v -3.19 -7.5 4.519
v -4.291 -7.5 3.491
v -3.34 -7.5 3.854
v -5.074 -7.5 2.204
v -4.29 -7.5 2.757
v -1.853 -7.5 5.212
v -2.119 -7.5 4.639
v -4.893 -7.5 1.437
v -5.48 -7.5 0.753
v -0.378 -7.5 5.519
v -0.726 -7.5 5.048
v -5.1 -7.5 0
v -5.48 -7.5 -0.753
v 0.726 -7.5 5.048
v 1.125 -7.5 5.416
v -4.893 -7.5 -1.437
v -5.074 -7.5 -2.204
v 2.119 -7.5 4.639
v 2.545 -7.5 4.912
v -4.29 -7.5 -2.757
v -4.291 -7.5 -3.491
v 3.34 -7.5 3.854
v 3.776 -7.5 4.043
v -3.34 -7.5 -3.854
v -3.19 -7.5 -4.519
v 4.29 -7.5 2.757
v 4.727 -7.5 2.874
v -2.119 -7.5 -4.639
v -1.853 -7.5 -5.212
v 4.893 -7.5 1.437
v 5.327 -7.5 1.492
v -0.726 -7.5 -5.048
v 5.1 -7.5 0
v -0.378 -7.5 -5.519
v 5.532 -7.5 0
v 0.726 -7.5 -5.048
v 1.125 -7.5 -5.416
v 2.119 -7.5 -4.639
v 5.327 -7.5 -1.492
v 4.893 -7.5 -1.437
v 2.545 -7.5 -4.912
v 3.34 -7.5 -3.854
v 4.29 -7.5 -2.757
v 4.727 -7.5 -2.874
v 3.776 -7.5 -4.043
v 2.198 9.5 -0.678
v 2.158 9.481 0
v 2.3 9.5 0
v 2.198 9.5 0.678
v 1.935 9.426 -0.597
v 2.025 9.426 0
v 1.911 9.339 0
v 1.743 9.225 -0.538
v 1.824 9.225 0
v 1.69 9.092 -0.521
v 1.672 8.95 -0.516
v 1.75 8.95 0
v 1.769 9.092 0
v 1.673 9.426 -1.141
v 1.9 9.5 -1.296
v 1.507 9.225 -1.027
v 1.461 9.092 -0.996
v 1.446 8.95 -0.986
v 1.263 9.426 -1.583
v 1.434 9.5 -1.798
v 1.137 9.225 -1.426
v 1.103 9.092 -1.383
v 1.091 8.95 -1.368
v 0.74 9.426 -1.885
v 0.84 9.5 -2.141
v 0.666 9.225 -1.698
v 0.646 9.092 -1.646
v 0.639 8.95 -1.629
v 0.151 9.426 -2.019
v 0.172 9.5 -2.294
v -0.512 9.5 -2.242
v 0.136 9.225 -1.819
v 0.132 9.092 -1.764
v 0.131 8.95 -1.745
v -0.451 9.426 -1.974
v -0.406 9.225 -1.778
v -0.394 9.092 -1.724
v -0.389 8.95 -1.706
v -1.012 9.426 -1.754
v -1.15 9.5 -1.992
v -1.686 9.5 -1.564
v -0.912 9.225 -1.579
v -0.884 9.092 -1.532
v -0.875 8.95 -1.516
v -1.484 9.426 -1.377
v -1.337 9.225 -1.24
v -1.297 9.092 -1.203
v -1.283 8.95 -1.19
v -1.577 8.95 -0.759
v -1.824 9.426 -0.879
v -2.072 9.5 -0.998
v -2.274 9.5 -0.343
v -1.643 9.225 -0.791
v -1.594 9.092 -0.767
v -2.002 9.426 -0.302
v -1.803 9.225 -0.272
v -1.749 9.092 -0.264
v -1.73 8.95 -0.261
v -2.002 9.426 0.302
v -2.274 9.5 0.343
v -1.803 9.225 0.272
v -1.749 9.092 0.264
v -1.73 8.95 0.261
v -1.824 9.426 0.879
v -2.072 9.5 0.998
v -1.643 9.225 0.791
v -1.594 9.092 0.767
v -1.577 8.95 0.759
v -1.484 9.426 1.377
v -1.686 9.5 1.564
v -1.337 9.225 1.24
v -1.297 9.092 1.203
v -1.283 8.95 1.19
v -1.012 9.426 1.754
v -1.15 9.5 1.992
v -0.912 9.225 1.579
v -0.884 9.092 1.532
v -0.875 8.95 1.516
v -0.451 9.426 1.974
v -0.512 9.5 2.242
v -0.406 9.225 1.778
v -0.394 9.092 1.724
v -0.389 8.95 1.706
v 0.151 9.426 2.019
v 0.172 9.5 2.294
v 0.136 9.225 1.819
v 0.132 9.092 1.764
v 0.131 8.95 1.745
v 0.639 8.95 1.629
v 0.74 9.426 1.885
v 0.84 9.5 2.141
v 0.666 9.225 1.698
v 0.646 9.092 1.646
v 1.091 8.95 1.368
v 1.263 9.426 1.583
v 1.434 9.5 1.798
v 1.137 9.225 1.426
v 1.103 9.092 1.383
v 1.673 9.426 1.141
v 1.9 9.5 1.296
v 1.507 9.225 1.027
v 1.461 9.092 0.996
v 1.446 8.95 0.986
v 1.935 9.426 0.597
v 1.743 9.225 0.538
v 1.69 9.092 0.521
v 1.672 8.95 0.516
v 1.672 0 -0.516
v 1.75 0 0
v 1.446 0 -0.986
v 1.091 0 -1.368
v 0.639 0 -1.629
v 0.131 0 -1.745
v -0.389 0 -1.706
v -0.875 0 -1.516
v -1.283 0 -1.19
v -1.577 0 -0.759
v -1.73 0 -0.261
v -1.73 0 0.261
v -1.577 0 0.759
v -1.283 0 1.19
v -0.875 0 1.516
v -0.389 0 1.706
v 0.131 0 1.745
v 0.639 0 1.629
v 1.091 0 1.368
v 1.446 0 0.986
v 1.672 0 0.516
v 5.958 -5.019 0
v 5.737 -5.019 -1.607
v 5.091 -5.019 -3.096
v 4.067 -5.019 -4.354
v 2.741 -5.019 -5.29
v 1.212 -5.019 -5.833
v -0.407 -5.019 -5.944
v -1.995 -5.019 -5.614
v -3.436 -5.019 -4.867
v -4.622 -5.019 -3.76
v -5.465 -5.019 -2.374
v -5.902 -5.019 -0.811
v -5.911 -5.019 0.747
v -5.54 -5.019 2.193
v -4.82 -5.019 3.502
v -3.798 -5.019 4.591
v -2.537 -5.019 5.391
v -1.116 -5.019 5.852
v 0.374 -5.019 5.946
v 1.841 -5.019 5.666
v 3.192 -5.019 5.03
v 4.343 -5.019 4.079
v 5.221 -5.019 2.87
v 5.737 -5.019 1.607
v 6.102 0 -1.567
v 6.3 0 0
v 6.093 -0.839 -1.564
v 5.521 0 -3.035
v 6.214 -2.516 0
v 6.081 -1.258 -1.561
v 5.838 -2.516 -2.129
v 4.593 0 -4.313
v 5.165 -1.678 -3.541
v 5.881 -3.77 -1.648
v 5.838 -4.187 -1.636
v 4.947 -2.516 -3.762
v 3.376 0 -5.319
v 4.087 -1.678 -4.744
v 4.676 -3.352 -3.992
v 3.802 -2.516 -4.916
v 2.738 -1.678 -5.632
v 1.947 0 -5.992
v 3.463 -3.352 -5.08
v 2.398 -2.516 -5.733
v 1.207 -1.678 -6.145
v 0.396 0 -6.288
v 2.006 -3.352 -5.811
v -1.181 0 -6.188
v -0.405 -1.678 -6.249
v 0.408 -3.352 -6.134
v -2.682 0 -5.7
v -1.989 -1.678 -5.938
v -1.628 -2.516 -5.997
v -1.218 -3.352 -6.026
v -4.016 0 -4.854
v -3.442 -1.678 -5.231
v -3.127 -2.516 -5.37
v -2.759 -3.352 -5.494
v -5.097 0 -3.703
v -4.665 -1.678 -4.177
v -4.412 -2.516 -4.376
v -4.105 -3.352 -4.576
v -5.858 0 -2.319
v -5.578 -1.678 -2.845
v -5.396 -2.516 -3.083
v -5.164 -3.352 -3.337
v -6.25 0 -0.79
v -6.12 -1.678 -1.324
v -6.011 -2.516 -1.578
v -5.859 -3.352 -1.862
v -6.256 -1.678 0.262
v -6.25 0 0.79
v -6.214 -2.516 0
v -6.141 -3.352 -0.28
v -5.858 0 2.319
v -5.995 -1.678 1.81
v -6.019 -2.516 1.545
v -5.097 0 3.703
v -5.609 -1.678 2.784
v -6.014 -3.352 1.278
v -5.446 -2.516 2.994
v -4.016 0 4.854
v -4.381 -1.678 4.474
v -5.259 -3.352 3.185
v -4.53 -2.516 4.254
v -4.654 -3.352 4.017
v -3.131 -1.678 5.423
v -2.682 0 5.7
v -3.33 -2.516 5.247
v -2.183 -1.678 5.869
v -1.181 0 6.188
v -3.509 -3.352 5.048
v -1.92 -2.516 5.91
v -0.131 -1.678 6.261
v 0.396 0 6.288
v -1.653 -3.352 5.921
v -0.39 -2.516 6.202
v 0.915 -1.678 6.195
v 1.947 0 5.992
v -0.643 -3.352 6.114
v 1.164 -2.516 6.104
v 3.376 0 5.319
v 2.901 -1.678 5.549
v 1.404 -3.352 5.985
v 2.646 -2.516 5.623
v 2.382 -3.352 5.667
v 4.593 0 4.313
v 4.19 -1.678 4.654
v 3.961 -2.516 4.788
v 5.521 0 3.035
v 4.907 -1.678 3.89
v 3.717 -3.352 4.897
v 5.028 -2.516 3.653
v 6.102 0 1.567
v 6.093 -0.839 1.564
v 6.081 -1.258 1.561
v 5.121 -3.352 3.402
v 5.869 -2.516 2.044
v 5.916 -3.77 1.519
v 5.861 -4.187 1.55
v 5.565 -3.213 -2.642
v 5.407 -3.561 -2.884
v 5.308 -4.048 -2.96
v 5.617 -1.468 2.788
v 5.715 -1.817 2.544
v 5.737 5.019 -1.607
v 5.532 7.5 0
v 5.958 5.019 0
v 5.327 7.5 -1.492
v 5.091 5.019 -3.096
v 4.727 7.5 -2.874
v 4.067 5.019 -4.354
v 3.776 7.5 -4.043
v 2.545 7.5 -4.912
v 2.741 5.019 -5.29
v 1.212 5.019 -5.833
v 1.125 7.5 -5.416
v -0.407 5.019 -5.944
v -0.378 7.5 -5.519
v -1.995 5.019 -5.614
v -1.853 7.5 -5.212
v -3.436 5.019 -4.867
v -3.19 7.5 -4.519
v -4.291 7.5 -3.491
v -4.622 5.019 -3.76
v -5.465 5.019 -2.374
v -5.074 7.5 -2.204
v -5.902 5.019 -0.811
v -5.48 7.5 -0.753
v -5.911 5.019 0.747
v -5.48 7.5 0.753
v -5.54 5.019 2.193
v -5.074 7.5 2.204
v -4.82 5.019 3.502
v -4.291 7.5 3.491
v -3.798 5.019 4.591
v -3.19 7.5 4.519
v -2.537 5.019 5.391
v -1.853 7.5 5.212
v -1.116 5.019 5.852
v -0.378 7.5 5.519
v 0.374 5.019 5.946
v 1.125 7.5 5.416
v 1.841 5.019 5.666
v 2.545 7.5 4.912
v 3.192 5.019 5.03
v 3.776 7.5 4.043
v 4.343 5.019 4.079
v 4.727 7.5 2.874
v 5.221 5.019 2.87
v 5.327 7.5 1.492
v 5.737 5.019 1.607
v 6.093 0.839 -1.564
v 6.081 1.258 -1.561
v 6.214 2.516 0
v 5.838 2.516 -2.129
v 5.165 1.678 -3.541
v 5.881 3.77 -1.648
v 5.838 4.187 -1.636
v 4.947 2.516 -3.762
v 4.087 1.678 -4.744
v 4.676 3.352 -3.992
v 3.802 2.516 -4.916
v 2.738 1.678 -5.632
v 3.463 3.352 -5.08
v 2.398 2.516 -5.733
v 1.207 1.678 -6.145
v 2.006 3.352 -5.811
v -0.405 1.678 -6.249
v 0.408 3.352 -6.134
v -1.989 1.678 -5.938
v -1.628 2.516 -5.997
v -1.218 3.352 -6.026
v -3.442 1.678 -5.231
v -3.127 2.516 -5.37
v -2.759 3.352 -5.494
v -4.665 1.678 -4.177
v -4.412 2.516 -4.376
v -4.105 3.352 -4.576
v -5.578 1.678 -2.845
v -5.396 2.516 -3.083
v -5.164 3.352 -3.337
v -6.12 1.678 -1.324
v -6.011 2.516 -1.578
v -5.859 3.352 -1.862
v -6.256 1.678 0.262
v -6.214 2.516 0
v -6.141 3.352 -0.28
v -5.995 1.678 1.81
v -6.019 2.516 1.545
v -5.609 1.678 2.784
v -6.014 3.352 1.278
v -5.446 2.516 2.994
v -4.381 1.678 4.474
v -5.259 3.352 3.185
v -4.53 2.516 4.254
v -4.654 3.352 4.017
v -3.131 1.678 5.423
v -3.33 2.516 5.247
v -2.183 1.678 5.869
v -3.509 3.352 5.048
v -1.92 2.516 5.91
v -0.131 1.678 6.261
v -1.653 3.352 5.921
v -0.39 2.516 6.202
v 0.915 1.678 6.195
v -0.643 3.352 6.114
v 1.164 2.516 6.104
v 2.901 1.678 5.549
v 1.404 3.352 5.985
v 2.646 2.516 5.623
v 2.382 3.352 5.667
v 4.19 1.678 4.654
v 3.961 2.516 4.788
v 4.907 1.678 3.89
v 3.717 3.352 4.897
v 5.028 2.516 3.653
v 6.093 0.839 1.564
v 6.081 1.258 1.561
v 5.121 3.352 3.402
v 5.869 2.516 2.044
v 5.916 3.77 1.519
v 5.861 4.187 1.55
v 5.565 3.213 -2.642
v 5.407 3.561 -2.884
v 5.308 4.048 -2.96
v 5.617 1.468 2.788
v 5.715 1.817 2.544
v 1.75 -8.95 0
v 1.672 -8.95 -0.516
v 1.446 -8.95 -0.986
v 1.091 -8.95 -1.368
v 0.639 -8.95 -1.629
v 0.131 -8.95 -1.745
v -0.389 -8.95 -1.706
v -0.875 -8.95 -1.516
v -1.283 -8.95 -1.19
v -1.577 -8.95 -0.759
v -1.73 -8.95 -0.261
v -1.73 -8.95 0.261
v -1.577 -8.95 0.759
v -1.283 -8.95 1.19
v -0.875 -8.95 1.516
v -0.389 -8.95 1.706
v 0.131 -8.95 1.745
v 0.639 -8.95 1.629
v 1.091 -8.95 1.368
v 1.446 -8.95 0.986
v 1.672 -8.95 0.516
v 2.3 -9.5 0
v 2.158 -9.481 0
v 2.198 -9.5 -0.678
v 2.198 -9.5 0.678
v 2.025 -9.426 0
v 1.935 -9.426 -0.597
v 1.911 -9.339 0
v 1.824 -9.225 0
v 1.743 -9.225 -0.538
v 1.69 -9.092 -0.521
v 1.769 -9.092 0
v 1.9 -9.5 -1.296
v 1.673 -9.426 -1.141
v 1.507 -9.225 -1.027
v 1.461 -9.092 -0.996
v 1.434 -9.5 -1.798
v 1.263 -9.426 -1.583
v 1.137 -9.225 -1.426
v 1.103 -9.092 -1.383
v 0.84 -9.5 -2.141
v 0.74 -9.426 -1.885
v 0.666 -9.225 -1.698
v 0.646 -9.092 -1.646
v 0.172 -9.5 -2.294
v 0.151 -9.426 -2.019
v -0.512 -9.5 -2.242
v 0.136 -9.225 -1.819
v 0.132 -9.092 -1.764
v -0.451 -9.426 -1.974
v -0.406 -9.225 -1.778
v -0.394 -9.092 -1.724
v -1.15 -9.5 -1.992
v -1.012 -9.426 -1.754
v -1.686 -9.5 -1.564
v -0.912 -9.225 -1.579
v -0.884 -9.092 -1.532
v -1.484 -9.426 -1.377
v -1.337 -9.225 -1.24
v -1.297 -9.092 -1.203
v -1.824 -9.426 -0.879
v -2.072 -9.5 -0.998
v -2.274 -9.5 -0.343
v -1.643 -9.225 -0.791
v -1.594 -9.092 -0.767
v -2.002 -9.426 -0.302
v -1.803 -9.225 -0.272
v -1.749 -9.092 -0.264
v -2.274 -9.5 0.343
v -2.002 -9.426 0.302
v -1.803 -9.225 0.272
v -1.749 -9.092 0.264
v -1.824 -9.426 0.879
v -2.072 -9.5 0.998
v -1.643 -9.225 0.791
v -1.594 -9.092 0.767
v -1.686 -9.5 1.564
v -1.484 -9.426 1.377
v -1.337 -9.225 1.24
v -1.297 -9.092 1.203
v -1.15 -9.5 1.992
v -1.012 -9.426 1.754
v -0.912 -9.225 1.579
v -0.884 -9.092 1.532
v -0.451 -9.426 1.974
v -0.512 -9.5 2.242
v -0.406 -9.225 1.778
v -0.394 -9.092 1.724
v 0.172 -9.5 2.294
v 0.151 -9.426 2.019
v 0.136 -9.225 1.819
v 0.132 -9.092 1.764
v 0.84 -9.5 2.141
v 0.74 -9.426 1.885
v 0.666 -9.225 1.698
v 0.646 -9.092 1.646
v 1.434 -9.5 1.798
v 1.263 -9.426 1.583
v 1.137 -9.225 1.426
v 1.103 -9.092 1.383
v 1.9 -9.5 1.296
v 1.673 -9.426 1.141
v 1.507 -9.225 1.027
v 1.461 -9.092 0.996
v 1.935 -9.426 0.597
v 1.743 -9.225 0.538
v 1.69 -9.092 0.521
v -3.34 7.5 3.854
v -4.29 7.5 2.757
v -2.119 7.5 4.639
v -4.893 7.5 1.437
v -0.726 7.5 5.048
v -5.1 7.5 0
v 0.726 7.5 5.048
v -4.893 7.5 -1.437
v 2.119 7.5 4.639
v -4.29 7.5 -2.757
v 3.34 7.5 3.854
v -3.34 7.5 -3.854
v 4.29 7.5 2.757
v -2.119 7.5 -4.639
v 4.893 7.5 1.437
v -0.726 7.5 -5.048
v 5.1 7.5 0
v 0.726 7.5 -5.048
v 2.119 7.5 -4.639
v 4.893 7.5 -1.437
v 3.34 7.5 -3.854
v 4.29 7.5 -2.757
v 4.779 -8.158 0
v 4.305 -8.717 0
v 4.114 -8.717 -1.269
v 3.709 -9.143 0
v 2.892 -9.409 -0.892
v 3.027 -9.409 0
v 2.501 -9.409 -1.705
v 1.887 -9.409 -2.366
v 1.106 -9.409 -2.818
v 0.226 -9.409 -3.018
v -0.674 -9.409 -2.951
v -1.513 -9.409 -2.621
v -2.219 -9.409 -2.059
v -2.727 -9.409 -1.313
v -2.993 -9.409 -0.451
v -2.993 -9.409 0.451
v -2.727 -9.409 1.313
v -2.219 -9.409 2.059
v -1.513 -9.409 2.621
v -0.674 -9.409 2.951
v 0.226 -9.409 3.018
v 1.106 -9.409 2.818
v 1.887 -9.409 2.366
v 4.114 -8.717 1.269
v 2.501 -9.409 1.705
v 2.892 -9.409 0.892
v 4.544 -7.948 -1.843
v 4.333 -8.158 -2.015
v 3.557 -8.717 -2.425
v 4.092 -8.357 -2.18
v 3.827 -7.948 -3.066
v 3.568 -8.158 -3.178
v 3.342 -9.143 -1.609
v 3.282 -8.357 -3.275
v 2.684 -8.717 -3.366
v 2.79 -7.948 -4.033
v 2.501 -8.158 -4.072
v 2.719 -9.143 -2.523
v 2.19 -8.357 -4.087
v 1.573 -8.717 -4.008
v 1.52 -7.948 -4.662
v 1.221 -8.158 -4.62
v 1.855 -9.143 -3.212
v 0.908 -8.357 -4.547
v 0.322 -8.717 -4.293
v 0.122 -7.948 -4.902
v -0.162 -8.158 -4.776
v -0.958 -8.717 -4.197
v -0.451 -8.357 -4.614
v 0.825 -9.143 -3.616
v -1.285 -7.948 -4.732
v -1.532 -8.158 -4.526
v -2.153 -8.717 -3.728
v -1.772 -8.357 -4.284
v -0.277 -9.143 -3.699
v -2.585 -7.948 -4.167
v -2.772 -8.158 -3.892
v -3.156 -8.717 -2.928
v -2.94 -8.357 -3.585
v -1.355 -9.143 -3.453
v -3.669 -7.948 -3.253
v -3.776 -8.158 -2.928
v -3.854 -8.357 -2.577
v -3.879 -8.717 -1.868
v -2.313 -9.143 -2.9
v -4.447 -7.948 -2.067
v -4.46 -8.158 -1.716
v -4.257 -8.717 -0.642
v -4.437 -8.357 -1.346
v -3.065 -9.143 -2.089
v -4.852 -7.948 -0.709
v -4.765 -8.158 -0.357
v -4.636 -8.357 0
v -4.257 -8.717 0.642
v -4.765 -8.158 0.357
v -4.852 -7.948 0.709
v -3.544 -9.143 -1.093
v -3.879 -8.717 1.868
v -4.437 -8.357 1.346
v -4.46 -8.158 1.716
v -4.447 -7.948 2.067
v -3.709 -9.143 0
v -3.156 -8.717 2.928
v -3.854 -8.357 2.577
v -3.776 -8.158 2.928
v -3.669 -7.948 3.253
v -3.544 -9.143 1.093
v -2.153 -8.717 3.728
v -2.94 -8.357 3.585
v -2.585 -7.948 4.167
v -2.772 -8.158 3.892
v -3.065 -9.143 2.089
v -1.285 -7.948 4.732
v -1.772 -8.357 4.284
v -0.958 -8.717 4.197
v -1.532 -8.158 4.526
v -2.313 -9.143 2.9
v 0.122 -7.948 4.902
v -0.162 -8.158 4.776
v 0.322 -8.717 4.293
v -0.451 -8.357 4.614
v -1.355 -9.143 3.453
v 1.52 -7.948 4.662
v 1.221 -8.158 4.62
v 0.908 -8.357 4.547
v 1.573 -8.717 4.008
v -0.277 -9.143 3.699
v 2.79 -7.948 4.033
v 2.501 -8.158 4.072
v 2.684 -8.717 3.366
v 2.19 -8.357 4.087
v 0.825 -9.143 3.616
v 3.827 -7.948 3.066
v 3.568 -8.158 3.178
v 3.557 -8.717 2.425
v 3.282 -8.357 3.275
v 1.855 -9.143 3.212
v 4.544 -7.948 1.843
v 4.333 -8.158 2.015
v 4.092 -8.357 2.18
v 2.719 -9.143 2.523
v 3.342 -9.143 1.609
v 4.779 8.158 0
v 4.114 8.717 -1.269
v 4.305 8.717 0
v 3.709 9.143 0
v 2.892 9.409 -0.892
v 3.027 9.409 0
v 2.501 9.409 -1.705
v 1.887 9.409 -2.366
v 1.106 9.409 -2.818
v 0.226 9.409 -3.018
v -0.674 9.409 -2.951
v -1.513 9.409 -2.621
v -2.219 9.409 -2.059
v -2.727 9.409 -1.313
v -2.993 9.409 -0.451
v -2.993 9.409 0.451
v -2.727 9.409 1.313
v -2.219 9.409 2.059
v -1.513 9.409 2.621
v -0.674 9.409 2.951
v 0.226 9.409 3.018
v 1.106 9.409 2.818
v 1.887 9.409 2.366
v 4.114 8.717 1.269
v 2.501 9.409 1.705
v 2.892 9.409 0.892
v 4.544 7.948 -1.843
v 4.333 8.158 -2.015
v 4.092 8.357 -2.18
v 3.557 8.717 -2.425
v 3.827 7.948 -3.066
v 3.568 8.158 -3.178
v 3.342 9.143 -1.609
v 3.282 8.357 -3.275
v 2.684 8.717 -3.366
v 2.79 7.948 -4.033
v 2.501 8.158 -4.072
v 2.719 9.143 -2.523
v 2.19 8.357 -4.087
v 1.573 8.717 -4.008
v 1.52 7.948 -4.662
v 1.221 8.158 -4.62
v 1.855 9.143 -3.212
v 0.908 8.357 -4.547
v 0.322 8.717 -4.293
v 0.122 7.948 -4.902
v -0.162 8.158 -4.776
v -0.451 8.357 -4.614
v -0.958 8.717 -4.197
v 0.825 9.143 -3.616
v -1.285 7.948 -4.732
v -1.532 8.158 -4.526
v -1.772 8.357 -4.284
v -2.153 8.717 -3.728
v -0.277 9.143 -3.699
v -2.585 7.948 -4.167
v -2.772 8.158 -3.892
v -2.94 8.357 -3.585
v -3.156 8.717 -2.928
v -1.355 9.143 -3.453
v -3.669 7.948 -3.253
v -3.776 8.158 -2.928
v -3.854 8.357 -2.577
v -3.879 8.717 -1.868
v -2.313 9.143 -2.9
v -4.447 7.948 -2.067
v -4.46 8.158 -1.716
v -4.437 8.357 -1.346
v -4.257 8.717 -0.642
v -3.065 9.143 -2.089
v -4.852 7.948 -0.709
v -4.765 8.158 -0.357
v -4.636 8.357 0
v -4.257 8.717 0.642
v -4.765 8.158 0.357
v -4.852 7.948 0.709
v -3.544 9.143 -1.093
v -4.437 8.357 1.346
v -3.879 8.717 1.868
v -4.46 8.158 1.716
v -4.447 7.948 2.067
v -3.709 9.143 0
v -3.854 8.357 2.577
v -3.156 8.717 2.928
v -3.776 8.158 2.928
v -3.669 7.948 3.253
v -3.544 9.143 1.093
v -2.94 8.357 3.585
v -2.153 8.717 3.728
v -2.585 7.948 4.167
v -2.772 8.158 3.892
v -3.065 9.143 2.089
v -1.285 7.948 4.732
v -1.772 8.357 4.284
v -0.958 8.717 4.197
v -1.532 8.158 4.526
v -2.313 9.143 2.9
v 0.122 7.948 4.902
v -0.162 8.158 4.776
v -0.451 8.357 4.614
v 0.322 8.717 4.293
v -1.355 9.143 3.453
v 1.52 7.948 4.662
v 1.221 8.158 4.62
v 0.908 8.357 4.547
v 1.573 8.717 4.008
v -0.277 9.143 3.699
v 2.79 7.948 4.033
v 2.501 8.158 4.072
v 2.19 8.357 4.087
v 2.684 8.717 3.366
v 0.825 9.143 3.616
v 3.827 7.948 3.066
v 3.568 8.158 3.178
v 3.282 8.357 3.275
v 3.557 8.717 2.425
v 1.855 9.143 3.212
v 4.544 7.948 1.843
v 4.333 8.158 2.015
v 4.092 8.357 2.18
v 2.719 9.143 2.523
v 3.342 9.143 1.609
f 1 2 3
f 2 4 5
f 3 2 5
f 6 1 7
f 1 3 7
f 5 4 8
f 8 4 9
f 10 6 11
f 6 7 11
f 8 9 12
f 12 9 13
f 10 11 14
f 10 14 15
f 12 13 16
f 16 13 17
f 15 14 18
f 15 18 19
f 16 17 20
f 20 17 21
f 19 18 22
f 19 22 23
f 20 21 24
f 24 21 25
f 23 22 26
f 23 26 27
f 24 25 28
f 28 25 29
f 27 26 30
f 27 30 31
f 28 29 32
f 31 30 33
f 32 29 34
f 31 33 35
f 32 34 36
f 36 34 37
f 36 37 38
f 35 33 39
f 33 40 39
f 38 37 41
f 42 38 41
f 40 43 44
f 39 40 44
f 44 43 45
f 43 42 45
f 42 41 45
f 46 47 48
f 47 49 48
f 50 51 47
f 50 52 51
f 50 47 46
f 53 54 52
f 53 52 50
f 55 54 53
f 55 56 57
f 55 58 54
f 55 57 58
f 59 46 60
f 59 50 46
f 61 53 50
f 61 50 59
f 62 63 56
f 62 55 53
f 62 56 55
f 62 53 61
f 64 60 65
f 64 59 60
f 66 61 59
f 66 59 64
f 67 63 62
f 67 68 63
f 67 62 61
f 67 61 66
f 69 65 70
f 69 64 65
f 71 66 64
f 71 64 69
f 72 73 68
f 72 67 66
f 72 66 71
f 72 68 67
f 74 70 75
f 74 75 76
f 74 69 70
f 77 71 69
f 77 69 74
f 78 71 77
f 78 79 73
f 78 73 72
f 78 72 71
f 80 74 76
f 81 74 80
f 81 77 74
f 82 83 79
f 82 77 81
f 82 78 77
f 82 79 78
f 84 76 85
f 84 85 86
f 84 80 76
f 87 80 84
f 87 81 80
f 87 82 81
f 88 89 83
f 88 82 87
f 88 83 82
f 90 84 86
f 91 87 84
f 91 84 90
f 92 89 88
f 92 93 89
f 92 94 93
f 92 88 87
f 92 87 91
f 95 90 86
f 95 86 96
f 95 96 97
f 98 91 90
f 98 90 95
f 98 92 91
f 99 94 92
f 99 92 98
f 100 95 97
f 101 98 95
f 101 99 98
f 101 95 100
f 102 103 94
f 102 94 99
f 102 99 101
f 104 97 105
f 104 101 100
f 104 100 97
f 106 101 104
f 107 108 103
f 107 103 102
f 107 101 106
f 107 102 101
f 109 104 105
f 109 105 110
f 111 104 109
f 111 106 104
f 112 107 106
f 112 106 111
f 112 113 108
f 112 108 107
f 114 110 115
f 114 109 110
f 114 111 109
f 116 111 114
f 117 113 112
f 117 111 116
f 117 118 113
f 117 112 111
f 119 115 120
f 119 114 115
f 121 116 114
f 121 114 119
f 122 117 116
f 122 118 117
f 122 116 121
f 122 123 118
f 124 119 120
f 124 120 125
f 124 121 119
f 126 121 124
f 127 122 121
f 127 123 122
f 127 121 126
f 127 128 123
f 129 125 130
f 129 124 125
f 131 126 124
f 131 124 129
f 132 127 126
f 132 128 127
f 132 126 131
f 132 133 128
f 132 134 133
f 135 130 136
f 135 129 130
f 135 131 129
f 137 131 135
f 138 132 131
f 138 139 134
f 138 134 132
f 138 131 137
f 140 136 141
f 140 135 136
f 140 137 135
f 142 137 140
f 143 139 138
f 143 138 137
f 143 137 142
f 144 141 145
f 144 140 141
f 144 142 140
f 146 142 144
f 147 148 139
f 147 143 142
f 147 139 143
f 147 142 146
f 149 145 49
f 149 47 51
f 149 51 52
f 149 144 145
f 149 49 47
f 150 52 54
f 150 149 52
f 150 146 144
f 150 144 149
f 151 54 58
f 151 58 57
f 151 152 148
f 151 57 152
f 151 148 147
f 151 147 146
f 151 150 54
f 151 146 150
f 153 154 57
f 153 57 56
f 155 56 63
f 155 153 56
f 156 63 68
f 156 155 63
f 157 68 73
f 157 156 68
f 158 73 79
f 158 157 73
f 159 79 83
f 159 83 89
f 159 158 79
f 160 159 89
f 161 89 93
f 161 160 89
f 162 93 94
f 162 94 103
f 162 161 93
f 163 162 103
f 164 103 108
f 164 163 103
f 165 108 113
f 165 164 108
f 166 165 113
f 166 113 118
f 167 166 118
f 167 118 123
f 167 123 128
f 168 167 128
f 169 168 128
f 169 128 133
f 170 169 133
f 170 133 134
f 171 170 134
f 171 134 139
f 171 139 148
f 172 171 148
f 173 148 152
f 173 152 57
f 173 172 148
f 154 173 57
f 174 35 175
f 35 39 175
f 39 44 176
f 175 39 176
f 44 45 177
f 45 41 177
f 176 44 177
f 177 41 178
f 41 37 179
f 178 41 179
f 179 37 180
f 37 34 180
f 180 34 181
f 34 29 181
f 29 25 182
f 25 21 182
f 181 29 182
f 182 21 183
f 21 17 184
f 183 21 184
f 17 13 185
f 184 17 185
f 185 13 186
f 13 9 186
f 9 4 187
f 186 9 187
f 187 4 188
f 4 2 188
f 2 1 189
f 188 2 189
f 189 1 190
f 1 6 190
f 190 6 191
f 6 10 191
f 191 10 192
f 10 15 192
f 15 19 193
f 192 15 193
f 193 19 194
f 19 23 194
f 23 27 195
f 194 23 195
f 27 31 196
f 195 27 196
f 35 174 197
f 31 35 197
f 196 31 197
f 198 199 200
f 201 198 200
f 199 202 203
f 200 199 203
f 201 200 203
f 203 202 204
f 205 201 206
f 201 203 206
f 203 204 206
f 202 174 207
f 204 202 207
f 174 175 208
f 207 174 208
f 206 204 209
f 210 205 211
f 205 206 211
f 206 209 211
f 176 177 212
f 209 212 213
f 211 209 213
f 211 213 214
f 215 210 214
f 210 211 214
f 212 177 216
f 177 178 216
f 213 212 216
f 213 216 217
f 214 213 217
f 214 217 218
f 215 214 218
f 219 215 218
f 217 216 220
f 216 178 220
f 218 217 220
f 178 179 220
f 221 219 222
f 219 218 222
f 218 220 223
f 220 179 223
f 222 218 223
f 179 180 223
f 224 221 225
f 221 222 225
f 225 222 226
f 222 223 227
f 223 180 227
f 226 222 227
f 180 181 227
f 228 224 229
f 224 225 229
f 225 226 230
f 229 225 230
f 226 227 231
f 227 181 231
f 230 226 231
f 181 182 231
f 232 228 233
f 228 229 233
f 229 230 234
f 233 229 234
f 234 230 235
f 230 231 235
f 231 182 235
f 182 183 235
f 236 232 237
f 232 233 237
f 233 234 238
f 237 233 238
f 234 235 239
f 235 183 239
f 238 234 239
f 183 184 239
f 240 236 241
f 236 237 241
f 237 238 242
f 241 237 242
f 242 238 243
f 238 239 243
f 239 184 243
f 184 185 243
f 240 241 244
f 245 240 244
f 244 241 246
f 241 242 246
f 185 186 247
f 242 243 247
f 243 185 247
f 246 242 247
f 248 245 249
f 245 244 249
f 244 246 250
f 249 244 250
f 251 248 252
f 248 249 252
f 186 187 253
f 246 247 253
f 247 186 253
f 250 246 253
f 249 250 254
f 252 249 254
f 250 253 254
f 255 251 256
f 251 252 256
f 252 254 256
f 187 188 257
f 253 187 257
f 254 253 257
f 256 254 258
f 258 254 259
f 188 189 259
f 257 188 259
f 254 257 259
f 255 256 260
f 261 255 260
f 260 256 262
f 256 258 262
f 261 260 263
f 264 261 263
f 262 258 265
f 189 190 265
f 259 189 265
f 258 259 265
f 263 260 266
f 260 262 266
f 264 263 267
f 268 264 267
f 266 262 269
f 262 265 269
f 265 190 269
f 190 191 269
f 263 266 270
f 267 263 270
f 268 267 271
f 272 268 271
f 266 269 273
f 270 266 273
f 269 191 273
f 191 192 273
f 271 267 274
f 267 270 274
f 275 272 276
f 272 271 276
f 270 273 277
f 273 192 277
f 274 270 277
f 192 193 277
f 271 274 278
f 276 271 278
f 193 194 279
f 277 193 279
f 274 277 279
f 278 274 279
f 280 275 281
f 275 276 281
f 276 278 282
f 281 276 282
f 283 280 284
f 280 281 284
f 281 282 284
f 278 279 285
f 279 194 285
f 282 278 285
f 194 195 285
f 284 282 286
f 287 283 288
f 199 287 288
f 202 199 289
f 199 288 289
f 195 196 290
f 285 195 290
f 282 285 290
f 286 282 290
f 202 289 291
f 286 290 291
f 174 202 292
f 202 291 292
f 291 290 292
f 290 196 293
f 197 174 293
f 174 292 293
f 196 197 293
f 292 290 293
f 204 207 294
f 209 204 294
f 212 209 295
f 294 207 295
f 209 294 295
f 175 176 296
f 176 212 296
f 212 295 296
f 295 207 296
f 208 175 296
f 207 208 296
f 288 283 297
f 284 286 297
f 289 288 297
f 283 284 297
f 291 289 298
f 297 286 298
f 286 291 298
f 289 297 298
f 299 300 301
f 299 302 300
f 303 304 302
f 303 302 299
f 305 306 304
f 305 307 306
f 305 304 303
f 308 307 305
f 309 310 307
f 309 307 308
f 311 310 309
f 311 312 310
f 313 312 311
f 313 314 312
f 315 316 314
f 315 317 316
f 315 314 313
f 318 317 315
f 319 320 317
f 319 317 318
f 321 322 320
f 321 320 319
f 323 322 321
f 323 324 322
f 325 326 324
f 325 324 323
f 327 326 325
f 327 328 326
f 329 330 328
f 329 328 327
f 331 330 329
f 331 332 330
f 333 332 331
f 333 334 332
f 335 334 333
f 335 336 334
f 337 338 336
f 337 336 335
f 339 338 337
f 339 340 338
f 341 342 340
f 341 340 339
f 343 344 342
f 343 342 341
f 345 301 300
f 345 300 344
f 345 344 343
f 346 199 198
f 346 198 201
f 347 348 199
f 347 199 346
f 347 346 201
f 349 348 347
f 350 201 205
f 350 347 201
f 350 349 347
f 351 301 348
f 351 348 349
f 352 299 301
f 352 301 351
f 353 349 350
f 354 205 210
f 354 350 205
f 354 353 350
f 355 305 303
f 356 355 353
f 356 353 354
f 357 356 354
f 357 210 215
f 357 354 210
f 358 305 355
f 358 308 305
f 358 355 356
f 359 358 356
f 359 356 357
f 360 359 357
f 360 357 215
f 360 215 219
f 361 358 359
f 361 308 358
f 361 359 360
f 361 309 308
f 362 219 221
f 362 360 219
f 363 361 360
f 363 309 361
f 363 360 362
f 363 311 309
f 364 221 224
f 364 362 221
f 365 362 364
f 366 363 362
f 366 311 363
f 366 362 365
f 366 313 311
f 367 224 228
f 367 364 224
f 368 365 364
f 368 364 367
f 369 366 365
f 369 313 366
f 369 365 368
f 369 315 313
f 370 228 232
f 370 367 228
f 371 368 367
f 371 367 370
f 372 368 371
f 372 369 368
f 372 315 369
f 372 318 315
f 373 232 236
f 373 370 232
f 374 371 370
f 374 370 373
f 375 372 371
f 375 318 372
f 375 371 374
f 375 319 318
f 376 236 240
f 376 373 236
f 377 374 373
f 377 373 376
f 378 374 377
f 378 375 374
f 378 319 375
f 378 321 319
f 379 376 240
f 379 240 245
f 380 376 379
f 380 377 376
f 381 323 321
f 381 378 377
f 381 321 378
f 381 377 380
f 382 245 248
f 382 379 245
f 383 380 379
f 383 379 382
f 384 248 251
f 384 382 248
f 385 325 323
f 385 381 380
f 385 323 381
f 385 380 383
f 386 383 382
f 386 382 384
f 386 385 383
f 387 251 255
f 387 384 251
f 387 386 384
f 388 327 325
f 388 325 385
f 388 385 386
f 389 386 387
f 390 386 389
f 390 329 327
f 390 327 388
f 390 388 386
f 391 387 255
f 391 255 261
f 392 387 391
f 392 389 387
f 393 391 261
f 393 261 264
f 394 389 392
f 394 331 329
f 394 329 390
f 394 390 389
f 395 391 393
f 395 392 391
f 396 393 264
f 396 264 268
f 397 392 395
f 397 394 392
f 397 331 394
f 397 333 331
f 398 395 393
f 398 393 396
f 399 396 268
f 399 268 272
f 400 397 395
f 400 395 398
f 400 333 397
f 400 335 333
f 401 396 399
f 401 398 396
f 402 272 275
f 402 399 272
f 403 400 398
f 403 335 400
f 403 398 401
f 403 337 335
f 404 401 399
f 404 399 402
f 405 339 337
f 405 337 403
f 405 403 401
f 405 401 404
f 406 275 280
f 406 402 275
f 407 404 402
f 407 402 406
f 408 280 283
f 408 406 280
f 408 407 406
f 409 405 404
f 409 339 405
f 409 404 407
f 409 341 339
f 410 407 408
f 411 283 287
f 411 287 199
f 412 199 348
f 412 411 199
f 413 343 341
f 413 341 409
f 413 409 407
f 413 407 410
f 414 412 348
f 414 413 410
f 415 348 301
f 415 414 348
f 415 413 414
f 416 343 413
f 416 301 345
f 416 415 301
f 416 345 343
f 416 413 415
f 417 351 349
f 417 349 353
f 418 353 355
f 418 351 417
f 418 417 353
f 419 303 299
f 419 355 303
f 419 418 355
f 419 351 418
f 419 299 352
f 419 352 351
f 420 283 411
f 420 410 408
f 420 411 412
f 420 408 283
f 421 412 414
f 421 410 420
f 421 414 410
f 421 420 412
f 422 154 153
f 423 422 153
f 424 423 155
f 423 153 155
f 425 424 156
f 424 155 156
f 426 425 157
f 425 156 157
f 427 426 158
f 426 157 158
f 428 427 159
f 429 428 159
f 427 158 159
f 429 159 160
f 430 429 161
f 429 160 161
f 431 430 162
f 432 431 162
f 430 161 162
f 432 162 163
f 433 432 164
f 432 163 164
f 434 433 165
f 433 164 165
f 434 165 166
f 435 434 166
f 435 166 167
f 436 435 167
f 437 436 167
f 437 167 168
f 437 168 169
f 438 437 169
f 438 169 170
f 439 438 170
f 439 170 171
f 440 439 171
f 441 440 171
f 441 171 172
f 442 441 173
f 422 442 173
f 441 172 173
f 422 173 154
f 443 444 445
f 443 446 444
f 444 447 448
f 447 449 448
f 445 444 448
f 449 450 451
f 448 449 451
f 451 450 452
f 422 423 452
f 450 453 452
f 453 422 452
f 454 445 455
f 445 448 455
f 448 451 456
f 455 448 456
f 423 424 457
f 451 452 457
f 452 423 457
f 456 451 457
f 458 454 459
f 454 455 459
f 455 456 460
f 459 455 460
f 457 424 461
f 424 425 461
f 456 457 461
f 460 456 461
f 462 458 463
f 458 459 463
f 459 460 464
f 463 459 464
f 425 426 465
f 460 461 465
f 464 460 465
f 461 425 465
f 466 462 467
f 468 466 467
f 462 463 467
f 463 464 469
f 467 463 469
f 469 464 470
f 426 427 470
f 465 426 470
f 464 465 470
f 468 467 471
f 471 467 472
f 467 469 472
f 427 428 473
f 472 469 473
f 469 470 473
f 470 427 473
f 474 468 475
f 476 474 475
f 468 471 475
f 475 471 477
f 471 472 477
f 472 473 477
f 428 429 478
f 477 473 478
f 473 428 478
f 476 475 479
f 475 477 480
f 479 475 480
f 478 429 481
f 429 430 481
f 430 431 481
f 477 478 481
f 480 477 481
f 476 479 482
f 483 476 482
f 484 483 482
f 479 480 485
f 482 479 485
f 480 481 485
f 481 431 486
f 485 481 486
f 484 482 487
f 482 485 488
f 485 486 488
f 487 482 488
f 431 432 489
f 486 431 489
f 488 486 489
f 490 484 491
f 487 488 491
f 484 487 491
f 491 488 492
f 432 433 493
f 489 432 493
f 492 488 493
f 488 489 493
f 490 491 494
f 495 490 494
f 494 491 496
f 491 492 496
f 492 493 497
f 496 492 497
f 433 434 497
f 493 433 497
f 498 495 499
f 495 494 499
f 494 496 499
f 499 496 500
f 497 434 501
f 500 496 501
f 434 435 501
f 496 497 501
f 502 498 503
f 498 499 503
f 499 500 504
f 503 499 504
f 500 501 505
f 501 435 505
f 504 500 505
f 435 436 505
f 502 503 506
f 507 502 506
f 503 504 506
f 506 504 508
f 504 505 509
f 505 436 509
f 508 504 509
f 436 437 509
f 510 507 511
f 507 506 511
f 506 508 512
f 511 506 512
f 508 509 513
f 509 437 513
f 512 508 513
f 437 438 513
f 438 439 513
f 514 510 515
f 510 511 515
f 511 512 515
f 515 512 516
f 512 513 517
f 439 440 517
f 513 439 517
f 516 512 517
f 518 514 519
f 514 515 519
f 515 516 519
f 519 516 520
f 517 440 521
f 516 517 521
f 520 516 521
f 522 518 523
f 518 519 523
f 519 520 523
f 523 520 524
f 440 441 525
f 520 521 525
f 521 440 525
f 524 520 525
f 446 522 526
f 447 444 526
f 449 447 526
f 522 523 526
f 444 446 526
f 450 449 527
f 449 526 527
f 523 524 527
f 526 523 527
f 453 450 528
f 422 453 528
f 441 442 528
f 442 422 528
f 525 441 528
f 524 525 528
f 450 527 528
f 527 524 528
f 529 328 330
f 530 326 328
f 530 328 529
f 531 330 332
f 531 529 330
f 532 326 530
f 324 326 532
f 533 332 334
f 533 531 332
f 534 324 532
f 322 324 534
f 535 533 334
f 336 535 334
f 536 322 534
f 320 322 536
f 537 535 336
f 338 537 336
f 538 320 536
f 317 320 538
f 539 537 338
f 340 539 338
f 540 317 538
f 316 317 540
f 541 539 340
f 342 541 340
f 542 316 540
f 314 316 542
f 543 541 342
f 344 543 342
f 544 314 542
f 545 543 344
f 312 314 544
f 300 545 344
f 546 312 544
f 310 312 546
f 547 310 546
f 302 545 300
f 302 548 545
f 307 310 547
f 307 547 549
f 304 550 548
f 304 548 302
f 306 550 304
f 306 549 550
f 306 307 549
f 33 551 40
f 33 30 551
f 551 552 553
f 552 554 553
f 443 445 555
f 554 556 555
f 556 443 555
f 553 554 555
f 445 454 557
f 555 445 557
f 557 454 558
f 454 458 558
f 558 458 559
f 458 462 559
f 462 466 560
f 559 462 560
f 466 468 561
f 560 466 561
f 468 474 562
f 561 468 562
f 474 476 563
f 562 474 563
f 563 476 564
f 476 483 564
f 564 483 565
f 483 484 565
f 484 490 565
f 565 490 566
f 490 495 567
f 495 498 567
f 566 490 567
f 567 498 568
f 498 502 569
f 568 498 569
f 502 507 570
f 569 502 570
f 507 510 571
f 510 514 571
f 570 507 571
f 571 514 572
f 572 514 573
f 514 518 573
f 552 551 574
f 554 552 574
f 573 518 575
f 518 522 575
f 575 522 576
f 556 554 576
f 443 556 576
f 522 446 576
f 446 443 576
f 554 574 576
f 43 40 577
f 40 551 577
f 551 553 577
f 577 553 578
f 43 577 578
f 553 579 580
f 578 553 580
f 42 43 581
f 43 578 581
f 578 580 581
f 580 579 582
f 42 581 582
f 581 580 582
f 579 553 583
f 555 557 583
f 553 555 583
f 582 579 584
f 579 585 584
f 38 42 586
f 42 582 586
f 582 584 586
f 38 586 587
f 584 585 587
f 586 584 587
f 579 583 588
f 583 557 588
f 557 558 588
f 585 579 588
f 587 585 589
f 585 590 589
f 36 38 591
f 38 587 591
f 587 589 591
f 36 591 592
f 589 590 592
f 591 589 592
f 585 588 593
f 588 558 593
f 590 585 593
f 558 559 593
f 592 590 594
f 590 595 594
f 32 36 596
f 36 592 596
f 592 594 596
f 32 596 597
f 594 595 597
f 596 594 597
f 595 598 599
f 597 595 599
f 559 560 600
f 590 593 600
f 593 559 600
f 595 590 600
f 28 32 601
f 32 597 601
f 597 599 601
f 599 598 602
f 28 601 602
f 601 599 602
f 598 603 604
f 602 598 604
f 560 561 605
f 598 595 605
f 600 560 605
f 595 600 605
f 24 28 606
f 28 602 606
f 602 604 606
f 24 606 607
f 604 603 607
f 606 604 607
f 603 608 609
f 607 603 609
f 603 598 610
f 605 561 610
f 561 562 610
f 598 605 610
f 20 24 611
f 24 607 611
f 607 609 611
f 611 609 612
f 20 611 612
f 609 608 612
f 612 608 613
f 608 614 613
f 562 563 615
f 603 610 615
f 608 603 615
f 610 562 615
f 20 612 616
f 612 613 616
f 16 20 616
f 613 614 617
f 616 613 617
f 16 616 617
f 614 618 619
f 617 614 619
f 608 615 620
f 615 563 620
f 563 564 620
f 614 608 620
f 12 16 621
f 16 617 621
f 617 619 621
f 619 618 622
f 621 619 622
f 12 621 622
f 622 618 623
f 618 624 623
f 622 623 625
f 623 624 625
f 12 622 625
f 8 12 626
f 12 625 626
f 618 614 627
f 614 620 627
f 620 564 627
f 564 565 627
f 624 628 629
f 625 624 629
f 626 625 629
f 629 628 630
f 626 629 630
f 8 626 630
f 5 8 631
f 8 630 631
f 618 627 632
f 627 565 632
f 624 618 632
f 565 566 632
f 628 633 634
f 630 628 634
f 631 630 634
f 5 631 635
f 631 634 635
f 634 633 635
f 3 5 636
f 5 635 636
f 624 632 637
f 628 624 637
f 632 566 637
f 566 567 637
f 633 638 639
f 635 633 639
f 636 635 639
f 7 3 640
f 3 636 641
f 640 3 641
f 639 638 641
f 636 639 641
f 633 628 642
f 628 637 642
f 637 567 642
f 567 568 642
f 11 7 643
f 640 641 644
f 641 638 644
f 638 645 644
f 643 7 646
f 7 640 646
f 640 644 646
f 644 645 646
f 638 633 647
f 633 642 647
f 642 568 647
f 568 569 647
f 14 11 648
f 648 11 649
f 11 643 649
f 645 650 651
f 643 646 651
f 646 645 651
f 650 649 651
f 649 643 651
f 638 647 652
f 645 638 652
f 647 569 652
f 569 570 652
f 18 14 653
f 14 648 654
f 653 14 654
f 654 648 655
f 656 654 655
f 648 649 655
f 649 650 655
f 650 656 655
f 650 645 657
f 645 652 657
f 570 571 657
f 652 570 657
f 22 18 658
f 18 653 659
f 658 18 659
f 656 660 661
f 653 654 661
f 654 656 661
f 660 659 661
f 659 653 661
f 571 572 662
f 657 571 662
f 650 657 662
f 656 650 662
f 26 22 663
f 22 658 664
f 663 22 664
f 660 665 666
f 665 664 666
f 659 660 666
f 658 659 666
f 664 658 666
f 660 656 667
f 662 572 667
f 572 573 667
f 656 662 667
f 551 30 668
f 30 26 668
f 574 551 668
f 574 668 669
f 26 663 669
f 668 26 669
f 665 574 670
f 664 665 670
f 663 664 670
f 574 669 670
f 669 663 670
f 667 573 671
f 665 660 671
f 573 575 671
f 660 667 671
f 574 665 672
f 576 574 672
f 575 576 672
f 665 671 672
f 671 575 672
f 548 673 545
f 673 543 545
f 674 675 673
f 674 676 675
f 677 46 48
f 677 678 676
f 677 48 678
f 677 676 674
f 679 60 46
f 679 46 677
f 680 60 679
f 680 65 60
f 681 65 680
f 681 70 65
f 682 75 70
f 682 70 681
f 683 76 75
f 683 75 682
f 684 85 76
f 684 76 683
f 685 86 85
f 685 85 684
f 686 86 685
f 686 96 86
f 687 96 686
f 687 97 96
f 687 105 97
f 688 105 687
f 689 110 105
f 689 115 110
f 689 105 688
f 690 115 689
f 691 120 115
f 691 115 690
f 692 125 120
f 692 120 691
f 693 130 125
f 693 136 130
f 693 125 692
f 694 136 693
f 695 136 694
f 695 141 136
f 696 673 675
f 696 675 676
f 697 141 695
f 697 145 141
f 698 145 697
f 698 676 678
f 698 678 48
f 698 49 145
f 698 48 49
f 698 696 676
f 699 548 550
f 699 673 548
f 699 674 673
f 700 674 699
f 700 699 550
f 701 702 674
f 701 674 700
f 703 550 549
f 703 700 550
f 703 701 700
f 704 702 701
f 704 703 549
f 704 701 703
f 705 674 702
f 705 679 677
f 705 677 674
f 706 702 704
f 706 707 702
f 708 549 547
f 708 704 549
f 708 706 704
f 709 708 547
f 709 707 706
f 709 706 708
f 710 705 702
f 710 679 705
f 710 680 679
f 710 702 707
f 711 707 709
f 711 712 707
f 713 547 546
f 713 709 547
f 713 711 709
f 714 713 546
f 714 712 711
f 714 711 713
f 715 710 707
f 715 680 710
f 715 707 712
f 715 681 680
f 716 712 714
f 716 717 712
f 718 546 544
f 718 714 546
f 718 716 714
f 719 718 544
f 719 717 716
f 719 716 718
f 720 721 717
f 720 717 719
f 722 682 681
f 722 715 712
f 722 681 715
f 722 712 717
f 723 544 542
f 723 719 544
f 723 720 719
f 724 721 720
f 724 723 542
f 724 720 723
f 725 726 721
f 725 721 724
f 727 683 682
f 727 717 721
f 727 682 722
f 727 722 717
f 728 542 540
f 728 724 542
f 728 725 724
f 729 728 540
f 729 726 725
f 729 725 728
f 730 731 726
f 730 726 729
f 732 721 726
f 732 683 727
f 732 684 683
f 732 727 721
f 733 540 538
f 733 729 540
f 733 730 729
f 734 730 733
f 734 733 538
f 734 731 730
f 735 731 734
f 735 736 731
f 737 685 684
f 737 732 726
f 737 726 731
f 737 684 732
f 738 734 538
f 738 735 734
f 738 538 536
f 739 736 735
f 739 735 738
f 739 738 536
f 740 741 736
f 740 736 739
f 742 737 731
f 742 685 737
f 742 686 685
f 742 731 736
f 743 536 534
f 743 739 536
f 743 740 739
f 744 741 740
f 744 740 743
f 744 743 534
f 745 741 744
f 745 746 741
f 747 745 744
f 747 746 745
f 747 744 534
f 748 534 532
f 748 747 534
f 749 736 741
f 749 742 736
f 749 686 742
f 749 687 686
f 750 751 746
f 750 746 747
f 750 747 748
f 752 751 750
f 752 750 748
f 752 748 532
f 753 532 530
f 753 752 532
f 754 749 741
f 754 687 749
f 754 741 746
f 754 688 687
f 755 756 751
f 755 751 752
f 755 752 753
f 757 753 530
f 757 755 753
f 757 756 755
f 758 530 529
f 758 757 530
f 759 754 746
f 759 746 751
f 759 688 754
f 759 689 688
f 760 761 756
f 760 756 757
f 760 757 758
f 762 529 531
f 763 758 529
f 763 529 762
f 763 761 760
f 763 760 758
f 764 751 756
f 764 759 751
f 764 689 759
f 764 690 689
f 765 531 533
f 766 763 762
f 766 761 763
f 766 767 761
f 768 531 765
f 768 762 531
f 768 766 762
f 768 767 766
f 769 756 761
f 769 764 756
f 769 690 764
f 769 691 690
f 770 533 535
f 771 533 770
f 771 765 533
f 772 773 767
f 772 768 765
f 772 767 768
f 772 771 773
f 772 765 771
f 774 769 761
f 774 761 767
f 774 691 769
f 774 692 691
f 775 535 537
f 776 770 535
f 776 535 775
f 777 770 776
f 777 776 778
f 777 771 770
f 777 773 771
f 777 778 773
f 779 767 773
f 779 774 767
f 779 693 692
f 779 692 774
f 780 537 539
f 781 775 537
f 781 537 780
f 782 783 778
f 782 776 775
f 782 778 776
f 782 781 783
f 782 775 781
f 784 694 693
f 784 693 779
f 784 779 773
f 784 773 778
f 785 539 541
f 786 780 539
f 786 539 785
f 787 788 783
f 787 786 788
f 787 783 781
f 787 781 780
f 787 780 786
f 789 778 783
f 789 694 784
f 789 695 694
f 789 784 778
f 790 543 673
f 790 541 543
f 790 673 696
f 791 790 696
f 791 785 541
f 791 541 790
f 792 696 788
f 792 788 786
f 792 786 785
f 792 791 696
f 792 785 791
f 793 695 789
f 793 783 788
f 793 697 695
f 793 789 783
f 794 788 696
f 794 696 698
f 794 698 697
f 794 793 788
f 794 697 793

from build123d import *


with BuildPart() as part:
    # Sketch1 → Revolve1 (revolve)
    with BuildSketch(Plane.XY):
        with BuildLine():
            Line((1.75, 0), (6.3, 0))
            ThreePointArc((6.3, 0), (6.107472102, 3.769615029), (5.531892029, 7.5))
            Line((5.531892029, 7.5), (5.1, 7.5))
            ThreePointArc((5.1, 7.5), (4.020465053, 8.948651075), (2.3, 9.5))
            ThreePointArc((2.3, 9.5), (1.91109127, 9.33890873), (1.75, 8.95))
            Line((1.75, 8.95), (1.75, 0))
        make_face()
    revolve1 = revolve(axis=Axis((0, 0, 0), (0, 1, 0)))

    # Mirror1: Revolve1 across plane
    add(revolve1.mirror(Plane(origin=(1.75, 0, 0), x_dir=(0, 0, 1), z_dir=(0, -1, 0))))


solid = part.part
